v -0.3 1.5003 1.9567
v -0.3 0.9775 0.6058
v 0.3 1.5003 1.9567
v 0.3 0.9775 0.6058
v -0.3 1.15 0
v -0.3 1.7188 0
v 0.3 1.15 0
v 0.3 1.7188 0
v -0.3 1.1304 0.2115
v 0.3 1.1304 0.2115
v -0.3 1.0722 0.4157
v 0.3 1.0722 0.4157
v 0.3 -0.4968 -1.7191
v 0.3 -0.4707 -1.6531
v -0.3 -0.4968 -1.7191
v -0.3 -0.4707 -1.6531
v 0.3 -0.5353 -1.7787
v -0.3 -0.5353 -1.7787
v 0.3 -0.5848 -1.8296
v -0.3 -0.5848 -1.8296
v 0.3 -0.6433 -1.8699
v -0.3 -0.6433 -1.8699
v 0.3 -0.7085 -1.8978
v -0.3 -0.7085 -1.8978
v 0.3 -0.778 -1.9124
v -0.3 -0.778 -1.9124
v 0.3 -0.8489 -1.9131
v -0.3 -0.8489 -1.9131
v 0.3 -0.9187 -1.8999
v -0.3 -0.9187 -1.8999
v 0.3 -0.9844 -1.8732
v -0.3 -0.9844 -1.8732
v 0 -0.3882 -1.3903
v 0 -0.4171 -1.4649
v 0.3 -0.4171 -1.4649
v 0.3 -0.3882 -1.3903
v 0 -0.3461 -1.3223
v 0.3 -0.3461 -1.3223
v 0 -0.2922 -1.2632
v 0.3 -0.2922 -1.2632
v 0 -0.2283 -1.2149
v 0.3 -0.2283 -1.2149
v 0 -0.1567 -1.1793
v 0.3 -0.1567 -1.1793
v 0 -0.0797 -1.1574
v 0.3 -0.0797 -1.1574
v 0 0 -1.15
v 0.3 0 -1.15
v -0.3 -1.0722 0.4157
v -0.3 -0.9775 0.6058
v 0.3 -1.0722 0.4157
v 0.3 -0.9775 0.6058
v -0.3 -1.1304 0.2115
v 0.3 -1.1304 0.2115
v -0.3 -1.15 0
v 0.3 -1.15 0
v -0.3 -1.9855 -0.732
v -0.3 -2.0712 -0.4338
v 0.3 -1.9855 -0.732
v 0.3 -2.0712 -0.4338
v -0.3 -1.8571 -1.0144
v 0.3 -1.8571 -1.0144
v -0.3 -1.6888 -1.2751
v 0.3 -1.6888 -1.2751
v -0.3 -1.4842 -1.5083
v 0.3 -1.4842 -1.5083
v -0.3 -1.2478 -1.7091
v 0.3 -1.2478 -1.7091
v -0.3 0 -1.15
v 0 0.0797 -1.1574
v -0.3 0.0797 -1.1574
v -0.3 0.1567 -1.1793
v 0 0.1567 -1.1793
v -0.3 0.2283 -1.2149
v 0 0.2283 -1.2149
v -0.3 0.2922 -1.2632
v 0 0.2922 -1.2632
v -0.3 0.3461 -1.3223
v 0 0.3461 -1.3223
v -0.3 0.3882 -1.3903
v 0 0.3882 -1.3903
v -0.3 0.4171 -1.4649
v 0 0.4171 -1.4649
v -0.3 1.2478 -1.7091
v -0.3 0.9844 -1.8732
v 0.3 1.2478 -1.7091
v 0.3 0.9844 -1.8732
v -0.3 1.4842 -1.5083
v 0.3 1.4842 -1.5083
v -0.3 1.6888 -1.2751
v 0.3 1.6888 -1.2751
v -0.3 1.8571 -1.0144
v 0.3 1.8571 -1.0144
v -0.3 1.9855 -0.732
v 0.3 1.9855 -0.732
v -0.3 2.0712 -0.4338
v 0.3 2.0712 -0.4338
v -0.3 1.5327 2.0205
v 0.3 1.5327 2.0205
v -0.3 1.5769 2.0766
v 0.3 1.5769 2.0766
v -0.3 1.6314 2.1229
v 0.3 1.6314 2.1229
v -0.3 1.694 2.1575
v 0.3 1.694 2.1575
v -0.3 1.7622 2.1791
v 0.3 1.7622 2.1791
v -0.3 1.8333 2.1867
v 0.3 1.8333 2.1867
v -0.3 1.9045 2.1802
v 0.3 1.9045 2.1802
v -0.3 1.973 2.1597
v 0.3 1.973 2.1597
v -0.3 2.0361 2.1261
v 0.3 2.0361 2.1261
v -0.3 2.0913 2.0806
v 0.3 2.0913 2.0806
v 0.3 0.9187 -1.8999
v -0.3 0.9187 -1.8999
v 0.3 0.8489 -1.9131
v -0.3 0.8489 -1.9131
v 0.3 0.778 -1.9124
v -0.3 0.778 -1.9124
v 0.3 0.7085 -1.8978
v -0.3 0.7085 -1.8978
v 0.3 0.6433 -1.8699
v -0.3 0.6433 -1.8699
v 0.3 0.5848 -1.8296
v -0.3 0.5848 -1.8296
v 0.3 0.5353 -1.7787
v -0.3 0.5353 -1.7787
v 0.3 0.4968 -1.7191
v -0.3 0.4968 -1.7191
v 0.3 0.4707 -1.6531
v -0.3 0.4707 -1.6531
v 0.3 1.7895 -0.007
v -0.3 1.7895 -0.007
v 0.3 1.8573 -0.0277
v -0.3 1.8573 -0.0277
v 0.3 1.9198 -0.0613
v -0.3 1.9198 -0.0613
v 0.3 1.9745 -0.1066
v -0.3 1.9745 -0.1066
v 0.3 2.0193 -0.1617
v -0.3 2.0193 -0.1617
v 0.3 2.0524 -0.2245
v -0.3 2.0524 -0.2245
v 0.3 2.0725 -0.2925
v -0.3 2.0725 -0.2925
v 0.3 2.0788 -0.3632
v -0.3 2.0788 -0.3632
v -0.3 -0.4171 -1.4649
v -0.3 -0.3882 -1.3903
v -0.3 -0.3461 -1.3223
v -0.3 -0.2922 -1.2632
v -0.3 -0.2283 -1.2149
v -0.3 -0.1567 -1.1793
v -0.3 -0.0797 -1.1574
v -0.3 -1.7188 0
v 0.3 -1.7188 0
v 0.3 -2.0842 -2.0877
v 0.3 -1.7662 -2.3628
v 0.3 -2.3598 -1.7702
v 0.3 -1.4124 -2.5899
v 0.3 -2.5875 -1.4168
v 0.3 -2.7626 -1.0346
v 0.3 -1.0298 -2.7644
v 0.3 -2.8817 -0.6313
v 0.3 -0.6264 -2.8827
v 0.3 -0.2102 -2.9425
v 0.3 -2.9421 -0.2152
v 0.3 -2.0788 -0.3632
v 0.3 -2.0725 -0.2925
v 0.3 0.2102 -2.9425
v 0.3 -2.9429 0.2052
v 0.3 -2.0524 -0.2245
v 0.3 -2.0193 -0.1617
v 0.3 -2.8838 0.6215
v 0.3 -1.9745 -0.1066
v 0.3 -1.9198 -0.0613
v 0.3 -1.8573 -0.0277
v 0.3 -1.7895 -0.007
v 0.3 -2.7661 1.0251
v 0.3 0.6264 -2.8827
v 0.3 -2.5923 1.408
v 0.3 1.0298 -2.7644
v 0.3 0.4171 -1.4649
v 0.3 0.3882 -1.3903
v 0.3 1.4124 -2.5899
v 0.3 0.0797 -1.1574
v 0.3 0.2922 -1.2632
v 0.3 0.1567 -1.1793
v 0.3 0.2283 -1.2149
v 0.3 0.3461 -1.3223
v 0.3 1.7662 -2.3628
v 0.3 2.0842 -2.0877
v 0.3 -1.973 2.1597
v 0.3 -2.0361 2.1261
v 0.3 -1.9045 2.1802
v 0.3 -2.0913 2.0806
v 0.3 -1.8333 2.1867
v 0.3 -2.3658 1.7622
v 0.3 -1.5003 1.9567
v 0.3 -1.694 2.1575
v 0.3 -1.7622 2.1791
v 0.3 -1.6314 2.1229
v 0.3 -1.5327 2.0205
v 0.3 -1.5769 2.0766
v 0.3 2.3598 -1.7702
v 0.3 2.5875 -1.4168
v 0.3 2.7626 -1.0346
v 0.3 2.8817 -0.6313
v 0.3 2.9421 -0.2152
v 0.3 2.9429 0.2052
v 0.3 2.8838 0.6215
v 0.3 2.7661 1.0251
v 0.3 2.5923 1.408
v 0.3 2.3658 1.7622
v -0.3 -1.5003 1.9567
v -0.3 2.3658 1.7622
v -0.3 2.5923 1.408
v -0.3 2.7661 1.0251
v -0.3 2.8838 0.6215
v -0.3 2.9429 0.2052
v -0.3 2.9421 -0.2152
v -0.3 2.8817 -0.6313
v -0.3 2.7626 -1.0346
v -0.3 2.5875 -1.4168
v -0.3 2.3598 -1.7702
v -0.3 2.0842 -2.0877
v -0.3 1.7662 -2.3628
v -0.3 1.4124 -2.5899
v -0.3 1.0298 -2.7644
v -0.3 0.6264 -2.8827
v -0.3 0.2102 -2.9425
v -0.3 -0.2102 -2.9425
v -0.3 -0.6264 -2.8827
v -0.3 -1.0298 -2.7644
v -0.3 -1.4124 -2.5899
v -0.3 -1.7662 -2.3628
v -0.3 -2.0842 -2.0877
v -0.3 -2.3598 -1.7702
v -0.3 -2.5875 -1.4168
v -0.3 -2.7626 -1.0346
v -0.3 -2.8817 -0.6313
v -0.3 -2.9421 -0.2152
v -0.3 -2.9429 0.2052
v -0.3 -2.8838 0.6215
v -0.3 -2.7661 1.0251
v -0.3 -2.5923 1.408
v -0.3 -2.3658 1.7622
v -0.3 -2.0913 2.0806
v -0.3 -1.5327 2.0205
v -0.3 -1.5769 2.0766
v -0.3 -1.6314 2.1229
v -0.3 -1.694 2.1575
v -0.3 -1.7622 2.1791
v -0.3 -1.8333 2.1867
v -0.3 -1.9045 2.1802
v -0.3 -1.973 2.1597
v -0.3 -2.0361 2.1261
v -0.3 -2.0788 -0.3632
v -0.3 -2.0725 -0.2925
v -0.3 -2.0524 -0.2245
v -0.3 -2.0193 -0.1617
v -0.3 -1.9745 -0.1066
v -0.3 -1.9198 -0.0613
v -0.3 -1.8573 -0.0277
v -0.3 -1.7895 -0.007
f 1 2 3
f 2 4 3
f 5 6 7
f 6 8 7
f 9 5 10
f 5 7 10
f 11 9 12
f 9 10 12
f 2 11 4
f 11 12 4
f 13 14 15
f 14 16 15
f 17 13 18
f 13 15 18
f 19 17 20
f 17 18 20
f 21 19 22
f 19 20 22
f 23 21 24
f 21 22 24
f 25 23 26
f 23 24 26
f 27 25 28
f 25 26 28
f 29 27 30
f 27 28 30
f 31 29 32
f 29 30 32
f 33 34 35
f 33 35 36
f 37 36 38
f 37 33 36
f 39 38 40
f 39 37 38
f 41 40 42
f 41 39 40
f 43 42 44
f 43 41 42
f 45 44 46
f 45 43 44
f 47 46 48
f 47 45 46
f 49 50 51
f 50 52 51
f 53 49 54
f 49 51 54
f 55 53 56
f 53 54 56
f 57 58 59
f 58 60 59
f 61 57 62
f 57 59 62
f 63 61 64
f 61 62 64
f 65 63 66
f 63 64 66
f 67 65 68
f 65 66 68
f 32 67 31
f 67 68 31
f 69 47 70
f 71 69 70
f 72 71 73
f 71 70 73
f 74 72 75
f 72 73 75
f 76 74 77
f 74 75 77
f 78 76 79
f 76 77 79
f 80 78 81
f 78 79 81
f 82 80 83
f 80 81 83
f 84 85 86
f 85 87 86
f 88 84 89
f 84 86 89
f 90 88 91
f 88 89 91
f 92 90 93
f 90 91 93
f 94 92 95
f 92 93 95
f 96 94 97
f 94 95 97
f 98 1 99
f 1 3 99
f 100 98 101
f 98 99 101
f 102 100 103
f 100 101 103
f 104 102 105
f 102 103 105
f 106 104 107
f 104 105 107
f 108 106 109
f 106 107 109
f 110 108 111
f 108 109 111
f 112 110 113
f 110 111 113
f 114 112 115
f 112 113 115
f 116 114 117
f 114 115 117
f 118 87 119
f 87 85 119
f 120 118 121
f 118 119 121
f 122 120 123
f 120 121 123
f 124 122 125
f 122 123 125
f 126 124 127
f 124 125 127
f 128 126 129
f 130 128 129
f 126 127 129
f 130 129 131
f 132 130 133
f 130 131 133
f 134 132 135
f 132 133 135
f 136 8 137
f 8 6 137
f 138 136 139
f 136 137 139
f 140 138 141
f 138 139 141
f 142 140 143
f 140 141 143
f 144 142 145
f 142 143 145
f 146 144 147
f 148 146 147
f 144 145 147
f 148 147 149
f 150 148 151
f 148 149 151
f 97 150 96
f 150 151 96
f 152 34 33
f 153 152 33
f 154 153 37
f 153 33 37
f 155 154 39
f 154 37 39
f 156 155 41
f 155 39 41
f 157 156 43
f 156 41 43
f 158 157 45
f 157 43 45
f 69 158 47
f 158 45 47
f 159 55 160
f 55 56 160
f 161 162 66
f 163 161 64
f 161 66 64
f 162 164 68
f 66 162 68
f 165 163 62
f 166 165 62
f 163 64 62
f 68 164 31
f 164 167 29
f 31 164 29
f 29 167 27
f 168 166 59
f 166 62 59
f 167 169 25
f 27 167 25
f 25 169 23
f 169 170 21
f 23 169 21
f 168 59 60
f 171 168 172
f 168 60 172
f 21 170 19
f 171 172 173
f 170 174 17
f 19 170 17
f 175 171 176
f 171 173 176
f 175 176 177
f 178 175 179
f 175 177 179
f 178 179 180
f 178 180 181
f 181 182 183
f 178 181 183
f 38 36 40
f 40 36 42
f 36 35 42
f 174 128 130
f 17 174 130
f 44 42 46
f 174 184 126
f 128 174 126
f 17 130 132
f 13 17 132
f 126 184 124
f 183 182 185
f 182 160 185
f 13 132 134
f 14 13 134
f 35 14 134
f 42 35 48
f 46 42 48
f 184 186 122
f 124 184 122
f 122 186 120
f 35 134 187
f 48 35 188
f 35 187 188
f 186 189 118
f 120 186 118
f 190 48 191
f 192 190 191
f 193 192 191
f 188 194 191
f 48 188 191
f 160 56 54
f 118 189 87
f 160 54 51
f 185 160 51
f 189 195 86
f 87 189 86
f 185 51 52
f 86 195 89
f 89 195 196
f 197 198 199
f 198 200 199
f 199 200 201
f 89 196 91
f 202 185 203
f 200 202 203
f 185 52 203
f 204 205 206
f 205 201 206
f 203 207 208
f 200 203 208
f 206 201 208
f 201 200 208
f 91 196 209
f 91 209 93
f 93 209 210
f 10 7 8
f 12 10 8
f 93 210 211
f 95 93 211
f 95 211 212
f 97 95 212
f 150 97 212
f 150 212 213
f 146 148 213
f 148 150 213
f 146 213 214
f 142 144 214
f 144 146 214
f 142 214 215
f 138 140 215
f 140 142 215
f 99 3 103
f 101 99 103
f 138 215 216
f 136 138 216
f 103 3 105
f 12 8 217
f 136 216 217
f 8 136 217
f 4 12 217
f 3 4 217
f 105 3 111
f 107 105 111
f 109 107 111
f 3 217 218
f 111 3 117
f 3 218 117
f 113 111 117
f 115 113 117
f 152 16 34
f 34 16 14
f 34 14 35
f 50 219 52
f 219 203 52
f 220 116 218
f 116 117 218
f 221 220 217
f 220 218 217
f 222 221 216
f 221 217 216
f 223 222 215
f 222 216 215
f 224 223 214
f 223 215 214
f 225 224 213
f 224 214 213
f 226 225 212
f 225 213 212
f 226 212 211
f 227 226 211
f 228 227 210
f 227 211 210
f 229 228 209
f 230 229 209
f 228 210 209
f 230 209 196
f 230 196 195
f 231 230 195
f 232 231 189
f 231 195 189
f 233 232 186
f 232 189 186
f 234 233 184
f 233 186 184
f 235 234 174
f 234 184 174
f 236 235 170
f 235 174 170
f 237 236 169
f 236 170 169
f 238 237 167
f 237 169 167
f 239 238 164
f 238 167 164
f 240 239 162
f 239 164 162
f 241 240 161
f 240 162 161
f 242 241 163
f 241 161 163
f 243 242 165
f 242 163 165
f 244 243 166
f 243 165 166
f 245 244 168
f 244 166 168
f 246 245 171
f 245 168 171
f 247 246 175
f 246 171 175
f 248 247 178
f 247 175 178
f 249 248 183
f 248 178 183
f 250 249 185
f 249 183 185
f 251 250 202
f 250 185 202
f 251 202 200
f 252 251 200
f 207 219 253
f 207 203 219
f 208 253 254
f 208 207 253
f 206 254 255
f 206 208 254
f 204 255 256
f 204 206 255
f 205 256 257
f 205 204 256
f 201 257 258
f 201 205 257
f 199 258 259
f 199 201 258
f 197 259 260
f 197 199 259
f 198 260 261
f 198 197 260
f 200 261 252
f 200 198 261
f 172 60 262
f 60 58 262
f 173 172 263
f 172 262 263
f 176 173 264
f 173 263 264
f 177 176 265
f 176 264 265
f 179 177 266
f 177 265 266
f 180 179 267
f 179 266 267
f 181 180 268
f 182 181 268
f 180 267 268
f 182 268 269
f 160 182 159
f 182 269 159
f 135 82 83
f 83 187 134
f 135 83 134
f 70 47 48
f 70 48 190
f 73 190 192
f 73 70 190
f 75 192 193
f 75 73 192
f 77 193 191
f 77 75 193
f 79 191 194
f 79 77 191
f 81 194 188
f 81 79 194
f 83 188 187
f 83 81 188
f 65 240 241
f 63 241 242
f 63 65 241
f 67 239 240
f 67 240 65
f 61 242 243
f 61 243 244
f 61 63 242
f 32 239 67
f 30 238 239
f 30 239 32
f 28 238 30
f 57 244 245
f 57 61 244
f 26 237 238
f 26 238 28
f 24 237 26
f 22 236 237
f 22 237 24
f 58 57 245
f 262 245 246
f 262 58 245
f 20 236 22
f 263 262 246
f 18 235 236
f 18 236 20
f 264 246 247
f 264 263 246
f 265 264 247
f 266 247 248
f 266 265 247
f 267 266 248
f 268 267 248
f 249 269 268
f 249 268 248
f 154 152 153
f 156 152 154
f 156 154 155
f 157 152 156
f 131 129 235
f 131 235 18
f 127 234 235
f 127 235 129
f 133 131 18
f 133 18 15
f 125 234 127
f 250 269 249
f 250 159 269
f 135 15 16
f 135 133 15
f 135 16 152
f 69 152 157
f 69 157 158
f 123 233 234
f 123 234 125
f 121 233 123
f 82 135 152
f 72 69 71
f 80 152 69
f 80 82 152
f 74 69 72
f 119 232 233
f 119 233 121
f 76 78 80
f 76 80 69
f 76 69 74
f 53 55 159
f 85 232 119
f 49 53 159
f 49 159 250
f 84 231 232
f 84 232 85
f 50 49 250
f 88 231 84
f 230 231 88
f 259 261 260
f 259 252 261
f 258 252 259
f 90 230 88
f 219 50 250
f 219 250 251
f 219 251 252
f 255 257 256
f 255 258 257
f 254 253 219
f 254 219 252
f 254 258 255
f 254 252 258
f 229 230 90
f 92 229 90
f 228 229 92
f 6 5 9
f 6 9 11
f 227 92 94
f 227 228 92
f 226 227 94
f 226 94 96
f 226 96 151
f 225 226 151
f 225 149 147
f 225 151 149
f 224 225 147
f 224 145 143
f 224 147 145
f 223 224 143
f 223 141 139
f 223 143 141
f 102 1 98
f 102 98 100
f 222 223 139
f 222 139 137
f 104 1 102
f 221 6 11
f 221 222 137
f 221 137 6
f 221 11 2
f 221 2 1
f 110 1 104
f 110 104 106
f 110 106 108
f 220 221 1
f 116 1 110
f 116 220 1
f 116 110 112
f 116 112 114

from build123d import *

# Parameters (mm, degrees)
EXTRUDE1_DEPTH          = 0.3
FILLET1_R               = 0.36
CUT_EXTRUDE1_DEPTH      = 1.3
CUT_EXTRUDE1_DEPTH_BACK = 1.3


with BuildPart() as part:
    # Sketch1 → Extrude1 (new body, symmetric)
    with BuildSketch(Plane(origin=(0, 0, 0), x_dir=(0, 0, -1), z_dir=(1, 0, 0))):
        with BuildLine():
            Line((-2.42403204, -1.681240217), (-0.605800091, -0.9775))
            ThreePointArc((-0.605800091, -0.9775), (-0.314940471, -1.106034584), (0, -1.15))
            Line((0, -1.15), (0, -2.116129032))
            ThreePointArc((0, -2.116129032), (1.275078567, -1.68883887), (2.035227733, -0.579525803))
            Line((2.035227733, -0.579525803), (1.106034584, -0.314940471))
            ThreePointArc((1.106034584, -0.314940471), (1.15, 0), (1.106034584, 0.314940471))
            Line((1.106034584, 0.314940471), (2.035227733, 0.579525803))
            ThreePointArc((2.035227733, 0.579525803), (1.275078567, 1.68883887), (0, 2.116129032))
            Line((0, 2.116129032), (0, 1.15))
            ThreePointArc((0, 1.15), (-0.314940471, 1.106034584), (-0.605800091, 0.9775))
            Line((-0.605800091, 0.9775), (-2.42403204, 1.681240217))
            ThreePointArc((-2.42403204, 1.681240217), (2.95, 0), (-2.42403204, -1.681240217))
        make_face()
    extrude(amount=EXTRUDE1_DEPTH, both=True)

    # Fillet1
    fillet1_edges = [part.edges().sort_by_distance(p)[0] for p in [
        (0, -1.681240217, 2.42403204),
        (0, -2.116129032, 0),
        (0, -0.579525803, -2.035227733),
        (0, 0.579525803, -2.035227733),
        (0, 2.116129032, 0),
        (0, 1.681240217, 2.42403204),
    ]]
    fillet(fillet1_edges, radius=FILLET1_R)

    # Sketch4 → Cut-Extrude1 (cut, two sides)
    with BuildSketch(Plane(origin=(0, 0, 0), x_dir=(0, 0, -1), z_dir=(1, 0, 0))) as cut_extrude1_sk:
        with BuildLine():
            ThreePointArc((1.106034584, 0.314940471), (1.138955612, 0.158997215), (1.15, 0))
            ThreePointArc((1.15, 0), (1.237576911, 0.26133867), (1.464940471, 0.417137988))
            Line((1.464940471, 0.417137988), (1.106034584, 0.314940471))
        make_face()
        with BuildLine():
            ThreePointArc((1.15, 0), (1.138955612, -0.158997215), (1.106034584, -0.314940471))
            Line((1.106034584, -0.314940471), (1.464940471, -0.417137988))
            ThreePointArc((1.464940471, -0.417137988), (1.237576911, -0.26133867), (1.15, 0))
        make_face()
    extrude(amount=CUT_EXTRUDE1_DEPTH, mode=Mode.SUBTRACT)
    extrude(cut_extrude1_sk.sketch, amount=-CUT_EXTRUDE1_DEPTH_BACK, mode=Mode.SUBTRACT)


solid = part.part
